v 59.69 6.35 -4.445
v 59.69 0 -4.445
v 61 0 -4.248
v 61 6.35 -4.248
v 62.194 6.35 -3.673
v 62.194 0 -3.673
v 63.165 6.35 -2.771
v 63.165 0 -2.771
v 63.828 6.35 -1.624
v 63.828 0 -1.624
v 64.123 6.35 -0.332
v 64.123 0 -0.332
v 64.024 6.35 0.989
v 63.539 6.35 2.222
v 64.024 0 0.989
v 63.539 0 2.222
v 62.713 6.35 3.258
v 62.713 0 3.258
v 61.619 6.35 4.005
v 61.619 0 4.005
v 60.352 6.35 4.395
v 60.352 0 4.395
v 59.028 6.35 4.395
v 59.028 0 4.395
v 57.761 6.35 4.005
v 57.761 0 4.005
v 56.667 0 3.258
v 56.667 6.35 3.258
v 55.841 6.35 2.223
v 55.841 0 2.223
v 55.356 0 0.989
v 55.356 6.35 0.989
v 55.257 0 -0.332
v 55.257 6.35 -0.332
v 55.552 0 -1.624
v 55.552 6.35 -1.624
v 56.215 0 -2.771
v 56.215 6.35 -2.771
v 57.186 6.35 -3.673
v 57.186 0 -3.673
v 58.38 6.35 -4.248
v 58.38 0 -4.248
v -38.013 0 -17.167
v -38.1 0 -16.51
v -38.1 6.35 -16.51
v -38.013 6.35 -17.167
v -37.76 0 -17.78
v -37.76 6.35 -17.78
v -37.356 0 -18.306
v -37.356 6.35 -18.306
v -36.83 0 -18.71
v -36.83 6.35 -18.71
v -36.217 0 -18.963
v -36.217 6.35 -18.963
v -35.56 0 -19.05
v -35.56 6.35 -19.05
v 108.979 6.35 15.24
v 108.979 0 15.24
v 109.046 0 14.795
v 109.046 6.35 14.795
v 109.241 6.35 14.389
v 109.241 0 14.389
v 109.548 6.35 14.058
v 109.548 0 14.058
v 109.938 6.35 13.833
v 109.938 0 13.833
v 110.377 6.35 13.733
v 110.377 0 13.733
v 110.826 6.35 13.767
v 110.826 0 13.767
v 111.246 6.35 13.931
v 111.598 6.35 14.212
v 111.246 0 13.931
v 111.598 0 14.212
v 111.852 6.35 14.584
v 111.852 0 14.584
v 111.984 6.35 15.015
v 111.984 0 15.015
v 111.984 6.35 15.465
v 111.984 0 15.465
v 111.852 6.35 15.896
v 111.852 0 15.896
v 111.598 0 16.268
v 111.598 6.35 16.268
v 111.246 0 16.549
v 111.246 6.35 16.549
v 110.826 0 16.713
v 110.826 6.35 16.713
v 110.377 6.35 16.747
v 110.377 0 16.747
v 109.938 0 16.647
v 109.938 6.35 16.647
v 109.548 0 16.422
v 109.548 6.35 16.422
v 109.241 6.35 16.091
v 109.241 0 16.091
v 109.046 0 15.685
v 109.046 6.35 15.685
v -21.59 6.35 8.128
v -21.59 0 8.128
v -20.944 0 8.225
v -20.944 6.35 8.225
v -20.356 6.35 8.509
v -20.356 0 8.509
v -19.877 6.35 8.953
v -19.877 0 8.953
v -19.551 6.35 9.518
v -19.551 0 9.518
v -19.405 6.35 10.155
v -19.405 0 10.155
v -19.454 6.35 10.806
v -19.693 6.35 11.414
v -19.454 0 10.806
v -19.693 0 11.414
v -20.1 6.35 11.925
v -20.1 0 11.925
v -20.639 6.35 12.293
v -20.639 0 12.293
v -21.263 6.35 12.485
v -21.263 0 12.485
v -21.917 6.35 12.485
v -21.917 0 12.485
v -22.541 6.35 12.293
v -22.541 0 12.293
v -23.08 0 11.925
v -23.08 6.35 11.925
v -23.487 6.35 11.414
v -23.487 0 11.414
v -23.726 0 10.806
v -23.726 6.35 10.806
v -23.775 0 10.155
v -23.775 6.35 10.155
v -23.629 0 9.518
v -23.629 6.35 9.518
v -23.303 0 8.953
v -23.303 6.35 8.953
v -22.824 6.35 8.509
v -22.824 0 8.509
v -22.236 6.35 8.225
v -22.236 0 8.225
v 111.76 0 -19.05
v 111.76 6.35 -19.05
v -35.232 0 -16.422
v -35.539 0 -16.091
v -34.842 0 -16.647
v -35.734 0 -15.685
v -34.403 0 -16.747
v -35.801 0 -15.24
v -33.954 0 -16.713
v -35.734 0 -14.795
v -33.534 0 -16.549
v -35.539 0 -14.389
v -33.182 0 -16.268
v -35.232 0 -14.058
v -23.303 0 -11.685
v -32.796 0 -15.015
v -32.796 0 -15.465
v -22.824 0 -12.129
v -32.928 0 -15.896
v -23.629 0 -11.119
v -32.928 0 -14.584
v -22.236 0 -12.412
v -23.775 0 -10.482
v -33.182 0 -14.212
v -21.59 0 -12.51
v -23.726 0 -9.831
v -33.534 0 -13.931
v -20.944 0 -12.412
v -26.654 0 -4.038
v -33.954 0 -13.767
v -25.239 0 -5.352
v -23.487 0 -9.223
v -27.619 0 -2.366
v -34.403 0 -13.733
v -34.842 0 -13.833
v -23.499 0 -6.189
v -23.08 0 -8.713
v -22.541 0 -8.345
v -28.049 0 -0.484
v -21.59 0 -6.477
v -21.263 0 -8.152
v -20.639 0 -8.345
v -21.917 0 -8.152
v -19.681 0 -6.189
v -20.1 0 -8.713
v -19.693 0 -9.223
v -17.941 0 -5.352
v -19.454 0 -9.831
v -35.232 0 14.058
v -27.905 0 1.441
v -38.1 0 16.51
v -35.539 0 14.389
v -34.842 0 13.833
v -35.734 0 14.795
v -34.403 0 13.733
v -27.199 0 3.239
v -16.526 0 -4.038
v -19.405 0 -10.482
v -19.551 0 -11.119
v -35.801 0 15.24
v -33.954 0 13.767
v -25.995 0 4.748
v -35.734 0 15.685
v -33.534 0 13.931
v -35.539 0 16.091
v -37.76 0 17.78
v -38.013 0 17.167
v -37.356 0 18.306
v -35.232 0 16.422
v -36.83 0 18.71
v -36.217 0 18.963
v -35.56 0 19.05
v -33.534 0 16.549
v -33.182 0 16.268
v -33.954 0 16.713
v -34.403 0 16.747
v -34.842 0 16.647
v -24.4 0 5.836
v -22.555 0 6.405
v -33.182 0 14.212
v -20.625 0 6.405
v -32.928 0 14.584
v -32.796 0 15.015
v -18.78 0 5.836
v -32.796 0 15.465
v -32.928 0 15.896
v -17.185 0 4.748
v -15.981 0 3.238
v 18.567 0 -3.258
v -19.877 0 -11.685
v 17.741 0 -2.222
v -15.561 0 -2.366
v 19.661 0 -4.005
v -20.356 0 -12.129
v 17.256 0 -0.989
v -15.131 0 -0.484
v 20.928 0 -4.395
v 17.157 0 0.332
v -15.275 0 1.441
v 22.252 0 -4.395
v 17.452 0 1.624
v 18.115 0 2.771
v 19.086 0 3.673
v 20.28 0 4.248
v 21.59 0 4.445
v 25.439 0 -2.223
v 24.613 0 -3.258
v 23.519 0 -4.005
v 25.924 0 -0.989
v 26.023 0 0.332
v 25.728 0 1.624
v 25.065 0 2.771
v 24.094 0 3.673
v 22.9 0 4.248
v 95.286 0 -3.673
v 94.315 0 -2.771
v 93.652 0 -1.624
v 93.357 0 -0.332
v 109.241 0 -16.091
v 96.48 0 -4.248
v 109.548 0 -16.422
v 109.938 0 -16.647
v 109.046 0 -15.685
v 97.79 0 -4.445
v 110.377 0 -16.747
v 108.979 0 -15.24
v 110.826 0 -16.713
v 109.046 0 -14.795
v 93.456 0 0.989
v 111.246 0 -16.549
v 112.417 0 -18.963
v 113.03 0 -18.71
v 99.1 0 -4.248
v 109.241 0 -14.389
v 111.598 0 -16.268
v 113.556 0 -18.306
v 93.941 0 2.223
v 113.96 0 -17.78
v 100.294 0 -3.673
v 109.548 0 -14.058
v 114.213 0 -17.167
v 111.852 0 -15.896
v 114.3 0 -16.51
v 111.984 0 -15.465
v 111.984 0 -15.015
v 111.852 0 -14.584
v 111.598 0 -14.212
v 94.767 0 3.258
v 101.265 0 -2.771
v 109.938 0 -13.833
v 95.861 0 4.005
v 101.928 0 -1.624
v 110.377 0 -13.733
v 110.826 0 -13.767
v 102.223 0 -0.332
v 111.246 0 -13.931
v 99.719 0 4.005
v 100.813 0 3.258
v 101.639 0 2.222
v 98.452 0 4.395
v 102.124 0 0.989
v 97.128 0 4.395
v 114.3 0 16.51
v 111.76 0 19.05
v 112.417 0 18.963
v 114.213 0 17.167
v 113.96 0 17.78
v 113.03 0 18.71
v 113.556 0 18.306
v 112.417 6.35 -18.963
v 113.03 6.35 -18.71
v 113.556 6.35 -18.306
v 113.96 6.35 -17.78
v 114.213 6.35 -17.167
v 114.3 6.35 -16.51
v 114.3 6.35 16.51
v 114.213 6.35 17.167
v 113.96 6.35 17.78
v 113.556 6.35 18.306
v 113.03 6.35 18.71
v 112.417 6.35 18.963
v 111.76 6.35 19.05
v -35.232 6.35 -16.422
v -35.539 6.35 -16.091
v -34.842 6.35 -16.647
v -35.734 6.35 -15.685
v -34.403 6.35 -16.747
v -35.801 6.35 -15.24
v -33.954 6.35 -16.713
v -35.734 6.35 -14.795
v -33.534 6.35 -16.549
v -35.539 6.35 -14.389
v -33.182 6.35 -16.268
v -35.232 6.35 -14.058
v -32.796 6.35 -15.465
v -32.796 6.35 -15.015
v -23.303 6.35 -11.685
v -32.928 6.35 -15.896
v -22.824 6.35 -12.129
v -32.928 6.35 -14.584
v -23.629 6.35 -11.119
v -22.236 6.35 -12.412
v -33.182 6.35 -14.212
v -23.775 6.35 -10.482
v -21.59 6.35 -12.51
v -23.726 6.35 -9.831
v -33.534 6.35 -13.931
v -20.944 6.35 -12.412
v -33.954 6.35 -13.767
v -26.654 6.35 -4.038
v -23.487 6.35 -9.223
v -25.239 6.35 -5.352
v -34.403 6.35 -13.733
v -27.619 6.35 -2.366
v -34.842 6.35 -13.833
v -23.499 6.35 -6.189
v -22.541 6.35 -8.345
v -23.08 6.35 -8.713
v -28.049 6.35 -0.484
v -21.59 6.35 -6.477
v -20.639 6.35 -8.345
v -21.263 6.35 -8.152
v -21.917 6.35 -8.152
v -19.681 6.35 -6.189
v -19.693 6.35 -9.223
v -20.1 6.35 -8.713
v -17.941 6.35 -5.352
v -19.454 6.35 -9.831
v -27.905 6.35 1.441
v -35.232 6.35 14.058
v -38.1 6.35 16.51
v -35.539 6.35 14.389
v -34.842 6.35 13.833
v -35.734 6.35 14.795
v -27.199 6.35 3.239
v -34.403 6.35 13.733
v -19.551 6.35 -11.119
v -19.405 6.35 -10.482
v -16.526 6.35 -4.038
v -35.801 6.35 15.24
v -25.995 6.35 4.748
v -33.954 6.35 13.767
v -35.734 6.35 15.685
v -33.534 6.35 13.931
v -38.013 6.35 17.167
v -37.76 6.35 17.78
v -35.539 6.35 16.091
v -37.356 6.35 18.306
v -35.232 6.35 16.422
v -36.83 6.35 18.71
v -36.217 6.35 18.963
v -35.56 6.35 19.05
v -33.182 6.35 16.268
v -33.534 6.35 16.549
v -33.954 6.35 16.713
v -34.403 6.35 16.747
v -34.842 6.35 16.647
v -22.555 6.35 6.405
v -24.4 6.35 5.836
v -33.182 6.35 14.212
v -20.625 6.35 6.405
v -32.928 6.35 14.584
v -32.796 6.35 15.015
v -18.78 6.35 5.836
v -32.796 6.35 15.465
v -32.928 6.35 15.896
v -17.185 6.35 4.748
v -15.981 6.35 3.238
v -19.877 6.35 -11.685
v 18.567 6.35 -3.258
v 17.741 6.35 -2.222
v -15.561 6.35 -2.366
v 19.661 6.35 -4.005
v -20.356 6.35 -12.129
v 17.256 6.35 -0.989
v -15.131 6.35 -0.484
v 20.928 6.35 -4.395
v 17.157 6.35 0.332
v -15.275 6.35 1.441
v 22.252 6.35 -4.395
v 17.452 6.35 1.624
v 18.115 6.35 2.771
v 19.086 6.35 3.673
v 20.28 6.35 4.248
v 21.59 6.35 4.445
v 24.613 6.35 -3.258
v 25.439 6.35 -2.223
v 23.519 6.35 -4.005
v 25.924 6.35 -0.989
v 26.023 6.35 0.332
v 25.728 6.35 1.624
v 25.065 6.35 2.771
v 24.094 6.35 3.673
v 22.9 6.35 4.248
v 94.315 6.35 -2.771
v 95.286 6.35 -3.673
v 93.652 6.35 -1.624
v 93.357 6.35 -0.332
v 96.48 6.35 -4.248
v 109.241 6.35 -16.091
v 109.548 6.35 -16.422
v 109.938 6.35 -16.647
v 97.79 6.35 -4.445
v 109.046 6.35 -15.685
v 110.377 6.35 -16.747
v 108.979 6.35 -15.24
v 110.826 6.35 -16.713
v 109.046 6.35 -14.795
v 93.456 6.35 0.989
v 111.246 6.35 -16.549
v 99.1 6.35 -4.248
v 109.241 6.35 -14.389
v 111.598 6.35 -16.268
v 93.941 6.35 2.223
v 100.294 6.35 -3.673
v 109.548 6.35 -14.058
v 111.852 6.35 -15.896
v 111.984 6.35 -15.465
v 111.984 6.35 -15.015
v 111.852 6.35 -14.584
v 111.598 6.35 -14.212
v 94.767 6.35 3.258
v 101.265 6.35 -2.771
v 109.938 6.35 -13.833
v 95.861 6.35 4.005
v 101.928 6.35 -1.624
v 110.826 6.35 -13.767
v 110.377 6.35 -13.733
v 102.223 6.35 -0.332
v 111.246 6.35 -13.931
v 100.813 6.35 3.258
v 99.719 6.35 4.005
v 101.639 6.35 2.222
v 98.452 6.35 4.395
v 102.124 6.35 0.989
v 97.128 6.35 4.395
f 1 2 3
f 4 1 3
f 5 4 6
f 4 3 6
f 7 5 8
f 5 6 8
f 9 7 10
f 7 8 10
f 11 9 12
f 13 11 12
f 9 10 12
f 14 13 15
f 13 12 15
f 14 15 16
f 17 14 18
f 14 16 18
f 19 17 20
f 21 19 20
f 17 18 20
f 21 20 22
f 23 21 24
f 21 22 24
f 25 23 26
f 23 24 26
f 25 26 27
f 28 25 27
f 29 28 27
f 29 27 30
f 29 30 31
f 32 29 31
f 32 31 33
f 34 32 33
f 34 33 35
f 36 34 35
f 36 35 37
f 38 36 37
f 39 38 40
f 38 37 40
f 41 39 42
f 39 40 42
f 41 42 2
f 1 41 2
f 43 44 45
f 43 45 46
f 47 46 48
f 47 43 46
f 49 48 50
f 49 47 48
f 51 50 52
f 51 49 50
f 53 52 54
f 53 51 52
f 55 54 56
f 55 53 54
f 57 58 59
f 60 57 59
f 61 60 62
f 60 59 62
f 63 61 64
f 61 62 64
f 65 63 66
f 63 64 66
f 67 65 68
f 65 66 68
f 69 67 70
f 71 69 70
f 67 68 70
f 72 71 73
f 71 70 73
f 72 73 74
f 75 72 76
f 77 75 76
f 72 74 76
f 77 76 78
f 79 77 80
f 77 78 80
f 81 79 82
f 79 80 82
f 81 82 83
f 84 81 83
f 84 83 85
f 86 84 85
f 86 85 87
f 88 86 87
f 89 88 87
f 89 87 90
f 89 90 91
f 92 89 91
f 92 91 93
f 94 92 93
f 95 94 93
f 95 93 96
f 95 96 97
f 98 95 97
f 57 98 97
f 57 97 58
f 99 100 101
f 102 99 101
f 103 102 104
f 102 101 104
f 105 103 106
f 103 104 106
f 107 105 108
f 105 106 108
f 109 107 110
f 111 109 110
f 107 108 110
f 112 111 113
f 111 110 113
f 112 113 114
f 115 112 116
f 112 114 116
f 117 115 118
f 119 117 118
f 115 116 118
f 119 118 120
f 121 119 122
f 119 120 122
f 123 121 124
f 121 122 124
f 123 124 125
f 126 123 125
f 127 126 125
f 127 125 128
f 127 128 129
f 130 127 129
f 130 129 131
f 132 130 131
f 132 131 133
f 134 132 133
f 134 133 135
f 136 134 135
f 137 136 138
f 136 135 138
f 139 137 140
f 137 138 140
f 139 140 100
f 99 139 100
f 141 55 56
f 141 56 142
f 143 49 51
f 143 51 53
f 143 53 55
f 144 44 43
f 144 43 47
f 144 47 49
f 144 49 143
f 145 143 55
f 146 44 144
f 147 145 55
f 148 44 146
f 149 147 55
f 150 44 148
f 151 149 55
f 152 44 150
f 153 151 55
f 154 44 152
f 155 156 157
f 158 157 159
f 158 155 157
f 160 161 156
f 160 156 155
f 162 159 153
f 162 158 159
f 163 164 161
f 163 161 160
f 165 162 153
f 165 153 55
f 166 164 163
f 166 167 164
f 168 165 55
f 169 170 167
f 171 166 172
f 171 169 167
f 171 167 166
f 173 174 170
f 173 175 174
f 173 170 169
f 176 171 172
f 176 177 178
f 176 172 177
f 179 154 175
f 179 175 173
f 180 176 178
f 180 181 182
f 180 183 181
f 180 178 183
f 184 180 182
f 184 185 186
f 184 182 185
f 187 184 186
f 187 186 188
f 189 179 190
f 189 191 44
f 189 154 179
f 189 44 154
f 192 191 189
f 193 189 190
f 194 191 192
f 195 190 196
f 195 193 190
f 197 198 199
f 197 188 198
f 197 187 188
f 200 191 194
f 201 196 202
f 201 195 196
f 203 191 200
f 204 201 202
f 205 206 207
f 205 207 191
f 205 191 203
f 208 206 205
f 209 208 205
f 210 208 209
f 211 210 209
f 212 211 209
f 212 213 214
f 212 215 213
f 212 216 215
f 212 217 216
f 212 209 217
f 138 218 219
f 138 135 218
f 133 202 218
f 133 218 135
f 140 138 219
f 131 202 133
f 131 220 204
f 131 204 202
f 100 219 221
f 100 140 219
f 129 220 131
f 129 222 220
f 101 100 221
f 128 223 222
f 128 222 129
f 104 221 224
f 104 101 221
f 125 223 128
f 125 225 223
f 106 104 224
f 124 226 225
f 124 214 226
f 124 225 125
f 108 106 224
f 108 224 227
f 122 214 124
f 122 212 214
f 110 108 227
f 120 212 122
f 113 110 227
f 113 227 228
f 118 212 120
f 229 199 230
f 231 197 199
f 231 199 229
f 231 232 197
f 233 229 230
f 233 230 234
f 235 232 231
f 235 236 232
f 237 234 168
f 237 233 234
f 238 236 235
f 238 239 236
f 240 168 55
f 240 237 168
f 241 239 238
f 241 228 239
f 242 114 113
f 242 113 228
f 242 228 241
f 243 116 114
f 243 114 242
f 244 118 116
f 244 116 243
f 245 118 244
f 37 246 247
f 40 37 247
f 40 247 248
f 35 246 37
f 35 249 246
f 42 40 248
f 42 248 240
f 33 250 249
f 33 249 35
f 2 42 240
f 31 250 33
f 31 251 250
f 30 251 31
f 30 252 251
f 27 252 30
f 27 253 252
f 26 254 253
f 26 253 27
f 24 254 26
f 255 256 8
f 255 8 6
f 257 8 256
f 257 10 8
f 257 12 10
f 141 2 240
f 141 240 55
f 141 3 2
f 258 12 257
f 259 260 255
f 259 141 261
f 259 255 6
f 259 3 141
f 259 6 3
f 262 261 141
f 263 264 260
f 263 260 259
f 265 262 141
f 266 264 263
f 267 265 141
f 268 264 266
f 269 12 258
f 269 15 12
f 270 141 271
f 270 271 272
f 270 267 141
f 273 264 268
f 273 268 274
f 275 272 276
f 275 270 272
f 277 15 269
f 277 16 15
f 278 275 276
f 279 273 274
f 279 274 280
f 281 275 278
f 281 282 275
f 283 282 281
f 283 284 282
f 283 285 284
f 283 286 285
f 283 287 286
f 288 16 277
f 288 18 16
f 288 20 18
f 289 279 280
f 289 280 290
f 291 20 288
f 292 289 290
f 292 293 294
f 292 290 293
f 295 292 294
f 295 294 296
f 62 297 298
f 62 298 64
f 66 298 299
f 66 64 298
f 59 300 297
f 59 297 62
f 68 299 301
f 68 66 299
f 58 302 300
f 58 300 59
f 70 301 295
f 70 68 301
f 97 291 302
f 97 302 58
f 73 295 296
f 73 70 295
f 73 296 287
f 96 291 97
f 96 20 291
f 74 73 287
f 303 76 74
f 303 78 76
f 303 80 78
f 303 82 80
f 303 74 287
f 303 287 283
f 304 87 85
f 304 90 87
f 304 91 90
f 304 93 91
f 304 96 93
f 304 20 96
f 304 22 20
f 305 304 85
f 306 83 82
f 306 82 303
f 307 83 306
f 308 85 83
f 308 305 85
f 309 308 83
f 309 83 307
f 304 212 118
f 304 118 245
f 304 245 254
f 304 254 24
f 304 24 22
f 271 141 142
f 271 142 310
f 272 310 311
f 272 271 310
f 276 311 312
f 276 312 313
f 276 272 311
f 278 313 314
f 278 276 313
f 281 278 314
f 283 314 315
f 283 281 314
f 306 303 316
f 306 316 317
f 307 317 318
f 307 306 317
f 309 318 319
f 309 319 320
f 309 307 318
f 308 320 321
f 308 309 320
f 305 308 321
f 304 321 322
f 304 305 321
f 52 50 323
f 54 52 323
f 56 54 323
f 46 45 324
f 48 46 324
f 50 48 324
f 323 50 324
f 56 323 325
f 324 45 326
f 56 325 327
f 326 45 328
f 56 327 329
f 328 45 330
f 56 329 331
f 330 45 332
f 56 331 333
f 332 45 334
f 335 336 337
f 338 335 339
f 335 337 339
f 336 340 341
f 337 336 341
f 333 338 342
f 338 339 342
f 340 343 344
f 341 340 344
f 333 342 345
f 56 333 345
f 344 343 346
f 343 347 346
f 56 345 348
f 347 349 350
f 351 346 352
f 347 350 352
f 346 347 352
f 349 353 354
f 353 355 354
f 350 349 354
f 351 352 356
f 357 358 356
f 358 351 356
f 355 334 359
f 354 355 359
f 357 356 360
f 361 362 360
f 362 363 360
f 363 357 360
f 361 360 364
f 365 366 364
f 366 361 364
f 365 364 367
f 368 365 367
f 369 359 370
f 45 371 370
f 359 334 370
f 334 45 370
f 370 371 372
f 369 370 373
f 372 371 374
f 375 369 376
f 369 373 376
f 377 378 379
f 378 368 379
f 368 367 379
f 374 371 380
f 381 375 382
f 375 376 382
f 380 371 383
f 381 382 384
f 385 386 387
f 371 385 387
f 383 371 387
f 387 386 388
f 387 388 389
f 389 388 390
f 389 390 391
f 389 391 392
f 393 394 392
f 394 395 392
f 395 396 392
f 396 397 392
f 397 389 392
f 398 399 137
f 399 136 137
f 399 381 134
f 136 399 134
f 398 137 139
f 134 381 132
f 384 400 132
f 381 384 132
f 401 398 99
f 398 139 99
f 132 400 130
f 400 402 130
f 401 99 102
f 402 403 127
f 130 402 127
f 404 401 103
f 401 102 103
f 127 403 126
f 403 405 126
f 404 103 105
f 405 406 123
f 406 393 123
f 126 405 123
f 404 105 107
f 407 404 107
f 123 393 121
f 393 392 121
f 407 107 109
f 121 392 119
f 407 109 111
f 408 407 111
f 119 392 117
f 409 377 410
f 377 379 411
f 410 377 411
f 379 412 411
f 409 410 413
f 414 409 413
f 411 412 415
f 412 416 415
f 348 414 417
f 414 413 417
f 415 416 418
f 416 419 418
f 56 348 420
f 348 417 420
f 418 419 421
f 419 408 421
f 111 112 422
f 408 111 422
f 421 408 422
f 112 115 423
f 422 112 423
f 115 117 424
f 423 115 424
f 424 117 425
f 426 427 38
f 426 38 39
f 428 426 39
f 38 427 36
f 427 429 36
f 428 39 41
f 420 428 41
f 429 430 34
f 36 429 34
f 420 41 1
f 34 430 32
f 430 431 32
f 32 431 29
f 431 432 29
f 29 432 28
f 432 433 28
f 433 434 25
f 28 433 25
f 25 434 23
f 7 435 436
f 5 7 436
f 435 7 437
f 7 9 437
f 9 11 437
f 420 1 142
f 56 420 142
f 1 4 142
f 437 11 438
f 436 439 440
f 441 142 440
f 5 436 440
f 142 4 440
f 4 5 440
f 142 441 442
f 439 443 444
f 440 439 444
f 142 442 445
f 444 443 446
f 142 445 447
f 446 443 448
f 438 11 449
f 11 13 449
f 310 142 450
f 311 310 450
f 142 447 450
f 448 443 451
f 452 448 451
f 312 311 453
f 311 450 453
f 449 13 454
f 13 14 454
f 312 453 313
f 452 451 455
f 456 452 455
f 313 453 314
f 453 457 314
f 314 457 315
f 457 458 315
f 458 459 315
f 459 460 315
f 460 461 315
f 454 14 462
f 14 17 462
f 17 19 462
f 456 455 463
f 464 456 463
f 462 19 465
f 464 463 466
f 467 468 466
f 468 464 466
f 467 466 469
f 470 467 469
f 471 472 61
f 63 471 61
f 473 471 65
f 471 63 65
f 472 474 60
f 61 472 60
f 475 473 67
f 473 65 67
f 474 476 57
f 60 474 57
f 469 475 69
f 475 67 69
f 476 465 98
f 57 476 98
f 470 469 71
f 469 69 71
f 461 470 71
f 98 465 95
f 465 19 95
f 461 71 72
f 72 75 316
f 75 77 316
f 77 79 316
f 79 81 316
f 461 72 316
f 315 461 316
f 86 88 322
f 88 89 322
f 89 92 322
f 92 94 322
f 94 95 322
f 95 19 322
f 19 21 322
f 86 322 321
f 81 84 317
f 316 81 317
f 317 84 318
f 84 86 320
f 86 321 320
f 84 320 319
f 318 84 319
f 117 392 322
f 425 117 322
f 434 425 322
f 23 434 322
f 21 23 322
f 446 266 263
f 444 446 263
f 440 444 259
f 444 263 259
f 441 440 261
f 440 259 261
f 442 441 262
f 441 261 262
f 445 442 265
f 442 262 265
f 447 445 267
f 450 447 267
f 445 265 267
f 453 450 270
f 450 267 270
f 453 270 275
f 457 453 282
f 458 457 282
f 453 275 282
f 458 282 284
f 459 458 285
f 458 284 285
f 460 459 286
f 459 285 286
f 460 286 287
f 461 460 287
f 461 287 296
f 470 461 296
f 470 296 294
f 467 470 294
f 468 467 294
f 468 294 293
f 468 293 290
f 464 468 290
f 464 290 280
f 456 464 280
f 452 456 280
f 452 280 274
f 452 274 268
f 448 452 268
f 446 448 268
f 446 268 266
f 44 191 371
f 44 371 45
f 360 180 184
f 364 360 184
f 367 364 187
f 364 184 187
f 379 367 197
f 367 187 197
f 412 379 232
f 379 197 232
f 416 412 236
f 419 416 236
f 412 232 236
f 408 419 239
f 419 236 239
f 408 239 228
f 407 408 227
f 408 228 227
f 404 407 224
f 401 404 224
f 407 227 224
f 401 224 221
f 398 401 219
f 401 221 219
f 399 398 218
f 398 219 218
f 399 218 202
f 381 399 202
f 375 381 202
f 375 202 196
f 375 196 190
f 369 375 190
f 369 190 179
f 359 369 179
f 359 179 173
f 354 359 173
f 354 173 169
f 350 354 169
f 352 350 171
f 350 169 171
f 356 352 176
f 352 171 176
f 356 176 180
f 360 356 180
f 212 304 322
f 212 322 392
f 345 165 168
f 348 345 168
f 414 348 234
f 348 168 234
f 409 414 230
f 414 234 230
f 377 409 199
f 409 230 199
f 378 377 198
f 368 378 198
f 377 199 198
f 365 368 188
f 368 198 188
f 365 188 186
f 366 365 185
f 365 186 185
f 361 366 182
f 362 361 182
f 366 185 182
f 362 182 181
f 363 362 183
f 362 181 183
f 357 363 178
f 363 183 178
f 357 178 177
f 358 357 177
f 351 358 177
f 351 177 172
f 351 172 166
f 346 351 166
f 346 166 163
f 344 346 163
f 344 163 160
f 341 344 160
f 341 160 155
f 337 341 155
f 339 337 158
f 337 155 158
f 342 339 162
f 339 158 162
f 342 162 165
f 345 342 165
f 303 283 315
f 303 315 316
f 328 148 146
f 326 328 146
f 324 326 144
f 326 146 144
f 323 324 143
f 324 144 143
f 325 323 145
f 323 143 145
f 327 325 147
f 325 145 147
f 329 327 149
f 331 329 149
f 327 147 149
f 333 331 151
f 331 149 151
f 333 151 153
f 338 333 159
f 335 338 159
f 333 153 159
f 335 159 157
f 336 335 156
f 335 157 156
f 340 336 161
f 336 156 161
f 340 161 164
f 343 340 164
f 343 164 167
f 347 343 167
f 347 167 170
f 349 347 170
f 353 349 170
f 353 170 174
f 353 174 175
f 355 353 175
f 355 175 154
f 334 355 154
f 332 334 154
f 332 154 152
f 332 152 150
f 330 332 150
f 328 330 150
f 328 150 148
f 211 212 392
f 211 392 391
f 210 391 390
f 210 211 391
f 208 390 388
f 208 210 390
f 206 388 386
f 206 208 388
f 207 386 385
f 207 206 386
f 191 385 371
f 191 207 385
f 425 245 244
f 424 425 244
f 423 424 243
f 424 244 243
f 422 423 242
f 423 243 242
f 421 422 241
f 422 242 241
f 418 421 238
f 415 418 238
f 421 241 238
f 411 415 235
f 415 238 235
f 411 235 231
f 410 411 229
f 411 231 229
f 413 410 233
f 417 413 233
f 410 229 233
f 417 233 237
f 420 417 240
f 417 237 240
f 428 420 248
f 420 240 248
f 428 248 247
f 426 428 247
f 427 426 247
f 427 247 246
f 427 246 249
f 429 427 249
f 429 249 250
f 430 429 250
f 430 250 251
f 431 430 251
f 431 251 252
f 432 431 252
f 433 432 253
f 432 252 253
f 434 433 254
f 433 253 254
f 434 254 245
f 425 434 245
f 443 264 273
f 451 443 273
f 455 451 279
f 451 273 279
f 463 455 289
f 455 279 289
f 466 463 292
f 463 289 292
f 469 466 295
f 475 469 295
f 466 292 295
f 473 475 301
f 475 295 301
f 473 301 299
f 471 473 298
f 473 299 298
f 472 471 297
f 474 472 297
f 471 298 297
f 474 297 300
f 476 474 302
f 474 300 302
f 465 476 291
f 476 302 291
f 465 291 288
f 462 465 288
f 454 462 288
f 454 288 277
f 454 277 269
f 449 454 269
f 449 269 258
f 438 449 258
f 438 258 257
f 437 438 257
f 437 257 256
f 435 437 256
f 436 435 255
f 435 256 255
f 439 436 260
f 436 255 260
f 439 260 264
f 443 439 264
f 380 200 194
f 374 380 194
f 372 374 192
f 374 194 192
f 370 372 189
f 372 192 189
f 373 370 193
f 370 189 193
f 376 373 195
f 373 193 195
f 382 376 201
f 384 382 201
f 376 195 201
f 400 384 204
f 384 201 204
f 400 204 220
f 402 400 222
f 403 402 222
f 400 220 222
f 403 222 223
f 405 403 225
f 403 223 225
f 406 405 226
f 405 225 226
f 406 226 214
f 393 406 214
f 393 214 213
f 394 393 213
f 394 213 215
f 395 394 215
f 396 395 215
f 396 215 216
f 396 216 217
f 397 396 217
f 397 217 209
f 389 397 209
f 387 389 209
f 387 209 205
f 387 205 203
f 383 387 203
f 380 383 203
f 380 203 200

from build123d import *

# Parameters (mm, degrees)
SKETCH1_R             = 4.445
SKETCH1_R_2           = 6.477
SKETCH1_R_3           = 2.19075
BOSS_EXTRUDE1_DEPTH   = 6.35
F_1_0MM_DOWEL_HOLE2_D = 3.0226


with BuildPart() as part:
    # Sketch1 → Boss-Extrude1 (new body)
    with BuildSketch(Plane.XZ):
        with BuildLine():
            Line((-35.56, -19.05), (111.76, -19.05))
            ThreePointArc((111.76, -19.05), (113.556051224, -18.306051224), (114.3, -16.51))
            Line((114.3, -16.51), (114.3, 16.51))
            ThreePointArc((114.3, 16.51), (113.556051224, 18.306051224), (111.76, 19.05))
            Line((111.76, 19.05), (-35.56, 19.05))
            ThreePointArc((-35.56, 19.05), (-37.356051224, 18.306051224), (-38.1, 16.51))
            Line((-38.1, 16.51), (-38.1, -16.51))
            ThreePointArc((-38.1, -16.51), (-37.356051224, -18.306051224), (-35.56, -19.05))
        make_face()
        with Locations(Location((59.69, 0, 0), (0, 0, 270))):
            Circle(SKETCH1_R, mode=Mode.SUBTRACT)
        with Locations(Location((97.79, 0, 0), (0, 0, 270))):
            Circle(SKETCH1_R, mode=Mode.SUBTRACT)
        with Locations(Location((-21.59, 0, 0), (0, 0, 270))):
            Circle(SKETCH1_R_2, mode=Mode.SUBTRACT)
        with Locations(Location((-21.59, -10.31875, 0), (0, 0, 270))):
            Circle(SKETCH1_R_3, mode=Mode.SUBTRACT)
        with Locations(Location((-21.59, 10.31875, 0), (0, 0, 270))):
            Circle(SKETCH1_R_3, mode=Mode.SUBTRACT)
        with Locations(Location((21.59, 0, 0), (0, 0, 90))):
            Circle(SKETCH1_R, mode=Mode.SUBTRACT)
    extrude(amount=-BOSS_EXTRUDE1_DEPTH)

    # Ø1.0mm Dowel Hole2 (through all)
    with Locations(Plane(origin=(0, 6.35, 0), x_dir=(1, 0, 0), z_dir=(0, 1, 0))):
        with Locations((-34.29, 15.24), (110.49, 15.24), (110.49, -15.24), (-34.29, -15.24)):
            Hole(F_1_0MM_DOWEL_HOLE2_D / 2)


solid = part.part
